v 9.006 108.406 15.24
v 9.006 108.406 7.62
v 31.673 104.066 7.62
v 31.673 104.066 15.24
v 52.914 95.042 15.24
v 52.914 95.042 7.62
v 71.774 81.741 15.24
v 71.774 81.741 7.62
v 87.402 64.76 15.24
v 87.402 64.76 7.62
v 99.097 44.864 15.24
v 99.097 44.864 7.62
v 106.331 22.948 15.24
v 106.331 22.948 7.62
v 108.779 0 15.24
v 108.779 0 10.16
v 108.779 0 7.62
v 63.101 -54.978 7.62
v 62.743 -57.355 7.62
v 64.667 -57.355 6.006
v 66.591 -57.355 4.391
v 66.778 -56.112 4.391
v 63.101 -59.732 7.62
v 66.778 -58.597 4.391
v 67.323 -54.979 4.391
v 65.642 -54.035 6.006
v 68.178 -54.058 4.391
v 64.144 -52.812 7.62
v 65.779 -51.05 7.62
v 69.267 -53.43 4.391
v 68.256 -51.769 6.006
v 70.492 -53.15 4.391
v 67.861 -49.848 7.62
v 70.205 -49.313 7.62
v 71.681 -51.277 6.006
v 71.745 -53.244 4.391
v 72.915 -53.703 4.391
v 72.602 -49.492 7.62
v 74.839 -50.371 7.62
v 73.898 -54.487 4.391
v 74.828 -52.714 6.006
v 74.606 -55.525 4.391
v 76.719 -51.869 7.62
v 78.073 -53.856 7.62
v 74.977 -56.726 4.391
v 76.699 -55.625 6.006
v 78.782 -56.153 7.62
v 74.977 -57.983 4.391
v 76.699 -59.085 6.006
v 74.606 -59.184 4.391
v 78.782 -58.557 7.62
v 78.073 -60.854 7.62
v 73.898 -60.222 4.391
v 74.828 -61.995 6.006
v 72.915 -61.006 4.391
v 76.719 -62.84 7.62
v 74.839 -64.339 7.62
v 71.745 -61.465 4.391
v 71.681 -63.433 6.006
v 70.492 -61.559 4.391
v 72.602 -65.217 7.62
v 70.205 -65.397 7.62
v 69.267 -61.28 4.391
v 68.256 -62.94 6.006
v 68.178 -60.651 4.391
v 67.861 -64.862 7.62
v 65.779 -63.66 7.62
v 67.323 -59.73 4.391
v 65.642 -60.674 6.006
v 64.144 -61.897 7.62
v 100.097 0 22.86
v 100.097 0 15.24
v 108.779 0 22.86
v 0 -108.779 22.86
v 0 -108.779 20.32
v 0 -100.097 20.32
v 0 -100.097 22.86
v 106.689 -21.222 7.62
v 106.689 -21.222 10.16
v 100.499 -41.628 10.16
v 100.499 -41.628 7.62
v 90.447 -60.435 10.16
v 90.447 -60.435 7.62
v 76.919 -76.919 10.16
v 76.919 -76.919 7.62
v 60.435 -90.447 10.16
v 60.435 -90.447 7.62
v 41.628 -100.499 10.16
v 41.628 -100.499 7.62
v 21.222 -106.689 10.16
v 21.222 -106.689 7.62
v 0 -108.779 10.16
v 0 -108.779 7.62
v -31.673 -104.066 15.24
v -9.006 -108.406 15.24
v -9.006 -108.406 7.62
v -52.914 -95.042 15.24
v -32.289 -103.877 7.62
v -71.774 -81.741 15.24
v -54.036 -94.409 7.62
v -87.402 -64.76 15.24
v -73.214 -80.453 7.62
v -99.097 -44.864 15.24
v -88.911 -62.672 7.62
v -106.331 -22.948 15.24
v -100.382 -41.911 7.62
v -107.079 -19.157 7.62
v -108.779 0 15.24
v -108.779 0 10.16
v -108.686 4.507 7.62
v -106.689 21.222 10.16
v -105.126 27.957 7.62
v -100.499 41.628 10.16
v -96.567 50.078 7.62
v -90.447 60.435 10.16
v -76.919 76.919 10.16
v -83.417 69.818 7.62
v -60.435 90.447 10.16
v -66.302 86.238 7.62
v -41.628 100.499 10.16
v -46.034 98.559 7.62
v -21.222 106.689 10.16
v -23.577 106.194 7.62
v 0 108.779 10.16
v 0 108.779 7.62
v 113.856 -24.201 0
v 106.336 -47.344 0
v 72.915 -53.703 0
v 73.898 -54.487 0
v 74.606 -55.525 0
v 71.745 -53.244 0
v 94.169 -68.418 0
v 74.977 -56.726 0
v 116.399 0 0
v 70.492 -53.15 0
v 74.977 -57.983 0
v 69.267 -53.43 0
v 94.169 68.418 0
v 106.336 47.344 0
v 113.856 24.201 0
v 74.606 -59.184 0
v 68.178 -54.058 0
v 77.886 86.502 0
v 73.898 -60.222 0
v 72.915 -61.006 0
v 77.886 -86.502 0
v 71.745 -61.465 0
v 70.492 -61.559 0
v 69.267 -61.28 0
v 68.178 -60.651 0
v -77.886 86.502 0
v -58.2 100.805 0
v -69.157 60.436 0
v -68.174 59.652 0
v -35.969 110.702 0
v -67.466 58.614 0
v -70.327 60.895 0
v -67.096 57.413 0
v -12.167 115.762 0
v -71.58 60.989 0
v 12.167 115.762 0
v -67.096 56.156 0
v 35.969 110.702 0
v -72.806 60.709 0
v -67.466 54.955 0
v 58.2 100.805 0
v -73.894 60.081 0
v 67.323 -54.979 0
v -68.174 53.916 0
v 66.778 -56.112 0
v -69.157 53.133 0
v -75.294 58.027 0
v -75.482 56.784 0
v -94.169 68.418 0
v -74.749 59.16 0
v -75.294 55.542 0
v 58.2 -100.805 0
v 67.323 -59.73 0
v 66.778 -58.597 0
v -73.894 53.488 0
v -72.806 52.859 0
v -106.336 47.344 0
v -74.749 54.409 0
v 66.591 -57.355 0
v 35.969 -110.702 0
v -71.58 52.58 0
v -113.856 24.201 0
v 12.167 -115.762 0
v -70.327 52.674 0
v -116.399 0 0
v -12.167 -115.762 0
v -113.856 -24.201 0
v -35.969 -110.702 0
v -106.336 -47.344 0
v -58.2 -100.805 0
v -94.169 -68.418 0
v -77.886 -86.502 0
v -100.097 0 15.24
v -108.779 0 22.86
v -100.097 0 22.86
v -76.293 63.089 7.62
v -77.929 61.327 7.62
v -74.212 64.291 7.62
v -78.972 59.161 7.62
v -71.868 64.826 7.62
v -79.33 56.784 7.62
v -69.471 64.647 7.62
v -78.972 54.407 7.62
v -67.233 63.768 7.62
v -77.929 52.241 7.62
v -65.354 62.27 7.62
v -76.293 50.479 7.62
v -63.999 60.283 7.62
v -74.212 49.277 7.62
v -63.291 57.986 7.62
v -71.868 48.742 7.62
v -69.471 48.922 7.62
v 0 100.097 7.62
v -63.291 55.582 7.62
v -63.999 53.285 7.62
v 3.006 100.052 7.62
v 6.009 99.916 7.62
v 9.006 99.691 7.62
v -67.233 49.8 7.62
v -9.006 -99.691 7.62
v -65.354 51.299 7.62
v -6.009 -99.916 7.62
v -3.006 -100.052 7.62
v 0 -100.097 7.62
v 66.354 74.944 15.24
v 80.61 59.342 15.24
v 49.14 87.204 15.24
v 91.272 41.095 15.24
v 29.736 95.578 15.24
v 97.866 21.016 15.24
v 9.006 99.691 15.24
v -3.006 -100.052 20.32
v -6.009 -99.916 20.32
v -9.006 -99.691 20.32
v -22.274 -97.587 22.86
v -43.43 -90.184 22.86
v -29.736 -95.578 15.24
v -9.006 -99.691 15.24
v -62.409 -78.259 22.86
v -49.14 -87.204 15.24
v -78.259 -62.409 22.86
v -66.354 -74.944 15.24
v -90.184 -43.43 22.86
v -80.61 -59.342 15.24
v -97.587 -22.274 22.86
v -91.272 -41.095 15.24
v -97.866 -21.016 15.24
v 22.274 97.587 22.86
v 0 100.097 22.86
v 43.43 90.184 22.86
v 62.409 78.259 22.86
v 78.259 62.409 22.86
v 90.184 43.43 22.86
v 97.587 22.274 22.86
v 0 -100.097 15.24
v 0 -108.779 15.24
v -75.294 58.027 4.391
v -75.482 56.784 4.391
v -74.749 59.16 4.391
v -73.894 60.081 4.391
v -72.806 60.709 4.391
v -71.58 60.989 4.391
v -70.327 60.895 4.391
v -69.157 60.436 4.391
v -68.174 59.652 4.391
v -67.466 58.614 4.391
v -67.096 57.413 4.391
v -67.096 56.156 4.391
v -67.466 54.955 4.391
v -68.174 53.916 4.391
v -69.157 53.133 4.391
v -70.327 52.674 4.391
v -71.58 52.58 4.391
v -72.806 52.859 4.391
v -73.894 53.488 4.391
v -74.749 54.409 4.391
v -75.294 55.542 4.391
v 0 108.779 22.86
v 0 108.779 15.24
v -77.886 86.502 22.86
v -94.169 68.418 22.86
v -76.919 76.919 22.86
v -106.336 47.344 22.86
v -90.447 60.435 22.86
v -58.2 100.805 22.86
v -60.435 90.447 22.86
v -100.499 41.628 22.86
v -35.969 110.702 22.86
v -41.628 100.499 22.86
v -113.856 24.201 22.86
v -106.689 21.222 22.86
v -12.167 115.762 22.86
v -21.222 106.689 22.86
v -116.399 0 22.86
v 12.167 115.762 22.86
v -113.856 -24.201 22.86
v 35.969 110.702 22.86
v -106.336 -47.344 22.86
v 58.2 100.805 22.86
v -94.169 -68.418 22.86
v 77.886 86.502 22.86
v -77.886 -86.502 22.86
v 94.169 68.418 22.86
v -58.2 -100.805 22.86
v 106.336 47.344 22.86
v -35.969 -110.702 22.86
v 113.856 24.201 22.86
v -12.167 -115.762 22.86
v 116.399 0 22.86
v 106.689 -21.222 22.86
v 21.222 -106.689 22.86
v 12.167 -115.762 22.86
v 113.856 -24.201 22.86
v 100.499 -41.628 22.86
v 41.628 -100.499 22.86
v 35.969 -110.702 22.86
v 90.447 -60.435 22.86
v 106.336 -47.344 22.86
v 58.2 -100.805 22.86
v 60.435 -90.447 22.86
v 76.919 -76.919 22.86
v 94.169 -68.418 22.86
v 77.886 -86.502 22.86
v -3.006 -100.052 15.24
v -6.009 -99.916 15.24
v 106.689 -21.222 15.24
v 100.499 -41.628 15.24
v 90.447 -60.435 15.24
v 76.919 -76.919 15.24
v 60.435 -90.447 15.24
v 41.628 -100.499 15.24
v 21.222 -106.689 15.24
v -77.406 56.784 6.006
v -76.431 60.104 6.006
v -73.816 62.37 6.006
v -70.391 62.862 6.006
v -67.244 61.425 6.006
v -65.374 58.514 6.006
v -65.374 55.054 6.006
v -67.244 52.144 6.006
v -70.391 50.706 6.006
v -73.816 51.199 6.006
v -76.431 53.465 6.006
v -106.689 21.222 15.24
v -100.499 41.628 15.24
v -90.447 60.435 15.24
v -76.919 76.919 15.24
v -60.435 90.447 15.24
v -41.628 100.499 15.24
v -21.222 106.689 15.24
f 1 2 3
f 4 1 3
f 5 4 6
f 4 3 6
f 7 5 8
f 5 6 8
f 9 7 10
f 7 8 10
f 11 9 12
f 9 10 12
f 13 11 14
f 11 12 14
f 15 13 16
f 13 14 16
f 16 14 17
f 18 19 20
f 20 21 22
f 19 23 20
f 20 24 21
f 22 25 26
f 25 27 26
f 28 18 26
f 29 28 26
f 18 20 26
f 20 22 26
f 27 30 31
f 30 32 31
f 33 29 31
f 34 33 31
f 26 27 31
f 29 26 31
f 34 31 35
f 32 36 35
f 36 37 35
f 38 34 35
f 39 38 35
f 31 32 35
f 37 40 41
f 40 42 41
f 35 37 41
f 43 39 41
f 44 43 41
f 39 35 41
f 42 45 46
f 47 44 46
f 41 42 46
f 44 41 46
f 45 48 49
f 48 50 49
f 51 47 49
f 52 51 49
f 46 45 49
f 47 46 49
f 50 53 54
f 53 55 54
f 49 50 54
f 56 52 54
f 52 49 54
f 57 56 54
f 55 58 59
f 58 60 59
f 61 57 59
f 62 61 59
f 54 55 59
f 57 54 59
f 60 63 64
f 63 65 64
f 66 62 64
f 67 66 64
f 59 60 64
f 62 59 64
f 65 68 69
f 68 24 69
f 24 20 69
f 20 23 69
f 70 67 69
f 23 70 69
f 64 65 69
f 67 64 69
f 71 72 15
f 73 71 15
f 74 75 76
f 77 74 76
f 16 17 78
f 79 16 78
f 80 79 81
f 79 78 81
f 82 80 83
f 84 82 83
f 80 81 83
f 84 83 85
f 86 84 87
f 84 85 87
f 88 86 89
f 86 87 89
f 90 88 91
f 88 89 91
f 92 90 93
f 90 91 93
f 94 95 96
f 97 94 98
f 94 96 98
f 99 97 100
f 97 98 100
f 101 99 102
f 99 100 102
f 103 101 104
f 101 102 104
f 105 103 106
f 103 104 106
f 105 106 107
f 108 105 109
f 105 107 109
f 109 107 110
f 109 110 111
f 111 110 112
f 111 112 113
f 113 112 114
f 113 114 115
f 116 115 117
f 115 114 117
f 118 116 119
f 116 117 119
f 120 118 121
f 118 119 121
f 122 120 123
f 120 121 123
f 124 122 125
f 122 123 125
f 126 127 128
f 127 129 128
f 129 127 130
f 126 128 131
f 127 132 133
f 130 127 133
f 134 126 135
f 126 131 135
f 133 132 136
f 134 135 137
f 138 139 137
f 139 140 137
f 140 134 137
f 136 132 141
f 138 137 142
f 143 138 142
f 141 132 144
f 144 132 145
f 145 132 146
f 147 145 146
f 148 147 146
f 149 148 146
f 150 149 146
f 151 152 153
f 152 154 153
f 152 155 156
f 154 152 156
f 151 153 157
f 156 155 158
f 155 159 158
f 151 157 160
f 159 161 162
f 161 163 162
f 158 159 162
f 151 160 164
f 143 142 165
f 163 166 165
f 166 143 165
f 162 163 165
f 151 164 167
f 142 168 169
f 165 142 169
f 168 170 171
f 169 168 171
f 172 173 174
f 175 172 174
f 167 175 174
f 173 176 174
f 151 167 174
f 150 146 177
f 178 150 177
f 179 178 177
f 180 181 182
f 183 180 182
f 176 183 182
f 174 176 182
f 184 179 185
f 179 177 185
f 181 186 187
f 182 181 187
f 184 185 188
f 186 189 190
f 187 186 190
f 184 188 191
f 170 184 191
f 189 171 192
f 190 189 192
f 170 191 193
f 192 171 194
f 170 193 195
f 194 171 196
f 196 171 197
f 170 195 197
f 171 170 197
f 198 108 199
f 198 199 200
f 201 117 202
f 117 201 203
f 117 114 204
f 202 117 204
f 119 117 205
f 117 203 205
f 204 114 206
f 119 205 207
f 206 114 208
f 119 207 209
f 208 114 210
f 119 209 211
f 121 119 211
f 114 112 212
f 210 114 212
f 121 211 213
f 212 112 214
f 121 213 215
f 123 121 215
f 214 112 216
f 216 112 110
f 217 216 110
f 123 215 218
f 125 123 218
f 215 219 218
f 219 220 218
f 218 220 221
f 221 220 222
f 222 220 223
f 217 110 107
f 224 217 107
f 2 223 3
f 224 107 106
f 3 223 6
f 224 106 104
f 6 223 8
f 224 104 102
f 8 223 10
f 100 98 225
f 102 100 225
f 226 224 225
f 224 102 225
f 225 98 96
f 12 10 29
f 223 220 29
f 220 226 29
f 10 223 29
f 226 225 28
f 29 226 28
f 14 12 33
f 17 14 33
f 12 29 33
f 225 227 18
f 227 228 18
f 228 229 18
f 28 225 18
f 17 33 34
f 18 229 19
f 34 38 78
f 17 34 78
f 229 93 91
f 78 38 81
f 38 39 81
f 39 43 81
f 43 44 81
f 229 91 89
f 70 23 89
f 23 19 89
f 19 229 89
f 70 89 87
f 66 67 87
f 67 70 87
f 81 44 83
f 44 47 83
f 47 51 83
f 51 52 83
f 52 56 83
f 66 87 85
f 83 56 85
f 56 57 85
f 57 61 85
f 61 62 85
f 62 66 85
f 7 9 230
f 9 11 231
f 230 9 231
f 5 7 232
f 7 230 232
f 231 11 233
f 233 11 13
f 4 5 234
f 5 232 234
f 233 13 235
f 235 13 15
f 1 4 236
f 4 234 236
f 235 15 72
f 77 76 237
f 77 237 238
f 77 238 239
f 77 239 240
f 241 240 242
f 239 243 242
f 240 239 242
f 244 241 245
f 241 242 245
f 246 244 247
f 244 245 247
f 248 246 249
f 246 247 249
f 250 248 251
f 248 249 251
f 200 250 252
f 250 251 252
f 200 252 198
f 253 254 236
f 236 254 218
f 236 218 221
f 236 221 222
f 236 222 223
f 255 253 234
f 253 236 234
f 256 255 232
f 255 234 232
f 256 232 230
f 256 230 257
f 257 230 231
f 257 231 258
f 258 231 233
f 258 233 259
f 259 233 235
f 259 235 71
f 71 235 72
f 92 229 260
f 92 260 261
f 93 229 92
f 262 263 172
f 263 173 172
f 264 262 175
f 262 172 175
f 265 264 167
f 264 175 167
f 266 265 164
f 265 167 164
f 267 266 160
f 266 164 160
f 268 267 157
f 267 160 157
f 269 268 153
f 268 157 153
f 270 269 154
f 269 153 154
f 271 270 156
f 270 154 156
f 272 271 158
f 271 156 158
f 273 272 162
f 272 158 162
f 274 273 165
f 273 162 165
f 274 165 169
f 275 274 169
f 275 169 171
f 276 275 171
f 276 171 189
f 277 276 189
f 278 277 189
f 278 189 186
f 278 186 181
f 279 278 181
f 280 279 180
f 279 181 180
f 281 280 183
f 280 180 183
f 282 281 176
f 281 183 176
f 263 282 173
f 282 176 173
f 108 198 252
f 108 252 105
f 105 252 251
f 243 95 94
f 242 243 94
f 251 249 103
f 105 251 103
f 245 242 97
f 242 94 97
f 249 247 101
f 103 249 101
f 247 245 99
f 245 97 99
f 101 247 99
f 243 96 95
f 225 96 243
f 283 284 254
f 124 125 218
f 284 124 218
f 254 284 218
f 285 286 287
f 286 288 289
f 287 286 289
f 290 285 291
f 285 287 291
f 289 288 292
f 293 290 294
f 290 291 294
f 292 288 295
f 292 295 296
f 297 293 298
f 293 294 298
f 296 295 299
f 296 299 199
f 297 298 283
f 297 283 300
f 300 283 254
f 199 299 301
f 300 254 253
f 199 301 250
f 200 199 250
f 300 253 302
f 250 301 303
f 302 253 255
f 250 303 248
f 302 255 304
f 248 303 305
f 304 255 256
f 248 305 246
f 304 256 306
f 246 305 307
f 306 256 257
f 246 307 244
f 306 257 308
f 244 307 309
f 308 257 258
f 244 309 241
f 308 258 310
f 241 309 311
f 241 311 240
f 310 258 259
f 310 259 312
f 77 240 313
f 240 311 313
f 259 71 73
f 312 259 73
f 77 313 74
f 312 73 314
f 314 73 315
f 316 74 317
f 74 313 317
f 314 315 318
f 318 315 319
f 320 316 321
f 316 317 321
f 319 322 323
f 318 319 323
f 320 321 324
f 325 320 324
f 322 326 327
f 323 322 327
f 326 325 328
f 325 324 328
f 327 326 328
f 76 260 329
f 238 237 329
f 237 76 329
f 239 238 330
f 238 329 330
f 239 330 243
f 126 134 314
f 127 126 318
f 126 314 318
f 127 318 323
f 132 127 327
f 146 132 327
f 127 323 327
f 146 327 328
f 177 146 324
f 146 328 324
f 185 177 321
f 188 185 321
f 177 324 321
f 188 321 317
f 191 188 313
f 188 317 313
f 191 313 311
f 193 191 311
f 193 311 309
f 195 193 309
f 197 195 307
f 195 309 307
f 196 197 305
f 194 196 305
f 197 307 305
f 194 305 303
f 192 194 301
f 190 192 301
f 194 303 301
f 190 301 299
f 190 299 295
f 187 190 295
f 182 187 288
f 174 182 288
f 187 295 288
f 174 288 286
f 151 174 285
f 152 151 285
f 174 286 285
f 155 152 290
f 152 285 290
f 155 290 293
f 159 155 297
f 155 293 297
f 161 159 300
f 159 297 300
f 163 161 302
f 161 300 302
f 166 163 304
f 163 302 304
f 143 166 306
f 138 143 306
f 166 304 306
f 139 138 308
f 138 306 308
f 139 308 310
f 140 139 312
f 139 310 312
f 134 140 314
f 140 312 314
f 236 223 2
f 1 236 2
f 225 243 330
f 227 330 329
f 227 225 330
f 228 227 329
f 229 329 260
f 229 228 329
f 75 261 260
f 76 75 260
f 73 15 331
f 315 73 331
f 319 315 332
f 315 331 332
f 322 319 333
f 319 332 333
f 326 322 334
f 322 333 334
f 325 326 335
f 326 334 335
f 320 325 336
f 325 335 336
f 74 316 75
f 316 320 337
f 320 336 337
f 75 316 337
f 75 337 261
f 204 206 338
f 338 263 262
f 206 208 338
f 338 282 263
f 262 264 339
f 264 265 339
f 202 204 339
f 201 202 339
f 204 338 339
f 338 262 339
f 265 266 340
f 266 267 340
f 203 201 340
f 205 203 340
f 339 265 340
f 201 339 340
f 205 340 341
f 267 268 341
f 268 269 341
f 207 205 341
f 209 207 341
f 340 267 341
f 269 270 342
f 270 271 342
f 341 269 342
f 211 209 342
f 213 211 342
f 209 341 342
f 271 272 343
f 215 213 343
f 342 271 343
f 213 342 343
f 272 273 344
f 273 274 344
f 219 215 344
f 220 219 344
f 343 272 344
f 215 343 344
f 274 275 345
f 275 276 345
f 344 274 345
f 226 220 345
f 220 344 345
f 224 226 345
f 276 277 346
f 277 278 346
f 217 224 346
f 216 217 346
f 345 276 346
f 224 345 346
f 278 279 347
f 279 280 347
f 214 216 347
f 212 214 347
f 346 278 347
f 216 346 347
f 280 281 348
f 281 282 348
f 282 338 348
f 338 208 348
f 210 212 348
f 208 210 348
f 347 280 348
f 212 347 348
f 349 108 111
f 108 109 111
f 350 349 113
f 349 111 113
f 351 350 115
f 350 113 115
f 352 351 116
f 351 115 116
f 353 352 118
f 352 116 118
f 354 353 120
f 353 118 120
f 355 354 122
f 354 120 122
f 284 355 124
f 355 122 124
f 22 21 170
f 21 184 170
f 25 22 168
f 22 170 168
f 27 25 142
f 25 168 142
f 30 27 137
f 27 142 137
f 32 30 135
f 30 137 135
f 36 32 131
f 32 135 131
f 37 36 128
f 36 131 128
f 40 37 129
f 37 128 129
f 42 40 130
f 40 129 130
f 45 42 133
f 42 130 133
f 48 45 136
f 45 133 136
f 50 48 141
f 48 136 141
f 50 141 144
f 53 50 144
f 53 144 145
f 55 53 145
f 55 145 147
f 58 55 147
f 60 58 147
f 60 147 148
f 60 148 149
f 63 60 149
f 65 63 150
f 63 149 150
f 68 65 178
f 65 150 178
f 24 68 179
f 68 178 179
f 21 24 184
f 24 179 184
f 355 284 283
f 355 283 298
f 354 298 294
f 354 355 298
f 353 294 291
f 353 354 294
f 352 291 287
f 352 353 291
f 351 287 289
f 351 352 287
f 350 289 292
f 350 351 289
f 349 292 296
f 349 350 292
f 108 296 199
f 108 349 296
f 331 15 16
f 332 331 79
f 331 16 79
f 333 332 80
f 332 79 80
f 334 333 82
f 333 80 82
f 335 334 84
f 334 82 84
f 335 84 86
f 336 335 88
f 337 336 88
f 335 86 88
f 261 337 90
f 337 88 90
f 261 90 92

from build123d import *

# Parameters (mm, degrees)
CUT_EXTRUDE1_START                                  = -12.700000000000001
CUT_EXTRUDE1_DEPTH                                  = 12.700000000000001
BOSS_EXTRUDE1_DEPTH                                 = 12.700000000000001
CSK_FOR_5_16_FLAT_HEAD_MACHINE_SCREW_10_D           = 8.4328
CSK_FOR_5_16_FLAT_HEAD_MACHINE_SCREW_10_CSINK_D     = 16.129
CSK_FOR_5_16_FLAT_HEAD_MACHINE_SCREW_10_CSINK_ANGLE = 100


with BuildPart() as part:
    # Sketch1 → Revolve1 (revolve)
    with BuildSketch(Plane(origin=(0, 0, 0), x_dir=(1, 0, 0), z_dir=(0, 1, 0)), mode=Mode.PRIVATE) as revolve1_sk:
        Polygon((0, 0), (-116.39944919199999, -1.425e-14), (-116.39944919199999, -6.350000000000014), (-116.39944919199999, -22.86), (-109.82551422519657, -22.86), (-100.09689936468882, -22.86), (-100.09689936468882, -15.239999999999998), (-108.77944919199999, -15.239999999999998), (-108.77944919199999, -7.619999999999999), (0, -7.619999999999999), align=None)
    revolve(revolve1_sk.sketch.rotate(Axis((0, 0, 7.619999999999999), (0, 0, -1)), 180), axis=Axis((0, 0, 7.619999999999999), (0, 0, -1)))

    # Sketch2 → Cut-Extrude1 (cut)
    with BuildSketch(Plane.XY.offset(22.86).offset(CUT_EXTRUDE1_START)):
        with BuildLine():
            Line((-108.77944919199999, -1.239e-14), (-14.769960459073417, 0))
            Line((-14.769960459073417, 0), (-4.49e-15, 14.76996045907346))
            Line((-4.49e-15, 14.76996045907346), (9.3e-16, 108.77944919199999))
            ThreePointArc((9.3e-16, 108.77944919199999), (-76.91868617740069, 76.9186861774007), (-108.77944919199999, -1.239e-14))
        make_face()
        with BuildLine():
            Line((2.664e-14, -108.77944919199999), (0, -24.8599350617269))
            Line((0, -24.8599350617269), (26.65786083148447, 0))
            Line((26.65786083148447, 0), (108.77944919199999, -9.3e-16))
            ThreePointArc((108.77944919199999, -9.3e-16), (76.9186861774007, -76.91868617740069), (2.664e-14, -108.77944919199999))
        make_face()
    extrude(amount=CUT_EXTRUDE1_DEPTH, mode=Mode.SUBTRACT)

    # Sketch4 → Boss-Extrude1 (add)
    with BuildSketch(Plane.XY.offset(7.619999999999999)):
        with BuildLine():
            Line((0, 108.77944919199999), (4.3e-16, 100.09689936468882))
            ThreePointArc((4.3e-16, 100.09689936468882), (4.507744656252515, 99.99534739445967), (9.006342768425501, 99.69089754015798))
            Line((9.006342768425501, 99.69089754015798), (9.006342768425501, 108.40597011443852))
            ThreePointArc((9.006342768425501, 108.40597011443852), (4.507041620723805, 108.68603931666647), (0, 108.77944919199999))
        make_face()
        with BuildLine():
            Line((2.389e-14, -100.09689936468882), (2.664e-14, -108.77944919199999))
            ThreePointArc((2.664e-14, -108.77944919199999), (-4.5070416207237916, -108.68603931666647), (-9.006342768425498, -108.40597011443852))
            Line((-9.006342768425498, -108.40597011443852), (-9.006342768425498, -99.69089754015796))
            ThreePointArc((-9.006342768425498, -99.69089754015796), (-4.507744656252502, -99.99534739445966), (2.389e-14, -100.09689936468882))
        make_face()
    extrude(amount=BOSS_EXTRUDE1_DEPTH)

    # CSK for 5/16 Flat Head Machine Screw (100)1 (through all)
    with Locations(Plane(origin=(-71.265307908, 56.784373632, 7.62), x_dir=(1, 0, 0), z_dir=(0, 0, 1))):
        with Locations((0, 0), (142.072512407, -114.138963606)):
            CounterSinkHole(CSK_FOR_5_16_FLAT_HEAD_MACHINE_SCREW_10_D / 2, CSK_FOR_5_16_FLAT_HEAD_MACHINE_SCREW_10_CSINK_D / 2, counter_sink_angle=CSK_FOR_5_16_FLAT_HEAD_MACHINE_SCREW_10_CSINK_ANGLE)


solid = part.part
